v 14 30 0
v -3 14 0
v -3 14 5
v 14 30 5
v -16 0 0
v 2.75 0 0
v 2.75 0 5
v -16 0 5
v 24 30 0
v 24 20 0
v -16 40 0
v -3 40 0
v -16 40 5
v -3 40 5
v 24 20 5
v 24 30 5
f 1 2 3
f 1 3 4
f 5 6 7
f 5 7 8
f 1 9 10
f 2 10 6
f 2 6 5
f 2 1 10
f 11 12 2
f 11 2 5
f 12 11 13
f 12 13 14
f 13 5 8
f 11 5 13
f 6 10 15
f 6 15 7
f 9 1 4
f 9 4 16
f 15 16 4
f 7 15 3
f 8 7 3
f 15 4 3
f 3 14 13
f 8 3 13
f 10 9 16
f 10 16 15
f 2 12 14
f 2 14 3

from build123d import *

# Parameters (mm, degrees)
PAD_DEPTH = 5


with BuildPart() as part:
    # Sketch → Pad (new body)
    with BuildSketch(Plane.XY):
        Polygon((0, 40), (13, 40), (13, 14), (30, 30), (40, 30), (40, 20), (18.75, 0), (0, 0), align=None)
    extrude(amount=PAD_DEPTH)


with BuildPart() as part_1:
    # Body placement: moved
    add(part.part.moved(Location((-16, 0, 0))))


solid = part_1.part
